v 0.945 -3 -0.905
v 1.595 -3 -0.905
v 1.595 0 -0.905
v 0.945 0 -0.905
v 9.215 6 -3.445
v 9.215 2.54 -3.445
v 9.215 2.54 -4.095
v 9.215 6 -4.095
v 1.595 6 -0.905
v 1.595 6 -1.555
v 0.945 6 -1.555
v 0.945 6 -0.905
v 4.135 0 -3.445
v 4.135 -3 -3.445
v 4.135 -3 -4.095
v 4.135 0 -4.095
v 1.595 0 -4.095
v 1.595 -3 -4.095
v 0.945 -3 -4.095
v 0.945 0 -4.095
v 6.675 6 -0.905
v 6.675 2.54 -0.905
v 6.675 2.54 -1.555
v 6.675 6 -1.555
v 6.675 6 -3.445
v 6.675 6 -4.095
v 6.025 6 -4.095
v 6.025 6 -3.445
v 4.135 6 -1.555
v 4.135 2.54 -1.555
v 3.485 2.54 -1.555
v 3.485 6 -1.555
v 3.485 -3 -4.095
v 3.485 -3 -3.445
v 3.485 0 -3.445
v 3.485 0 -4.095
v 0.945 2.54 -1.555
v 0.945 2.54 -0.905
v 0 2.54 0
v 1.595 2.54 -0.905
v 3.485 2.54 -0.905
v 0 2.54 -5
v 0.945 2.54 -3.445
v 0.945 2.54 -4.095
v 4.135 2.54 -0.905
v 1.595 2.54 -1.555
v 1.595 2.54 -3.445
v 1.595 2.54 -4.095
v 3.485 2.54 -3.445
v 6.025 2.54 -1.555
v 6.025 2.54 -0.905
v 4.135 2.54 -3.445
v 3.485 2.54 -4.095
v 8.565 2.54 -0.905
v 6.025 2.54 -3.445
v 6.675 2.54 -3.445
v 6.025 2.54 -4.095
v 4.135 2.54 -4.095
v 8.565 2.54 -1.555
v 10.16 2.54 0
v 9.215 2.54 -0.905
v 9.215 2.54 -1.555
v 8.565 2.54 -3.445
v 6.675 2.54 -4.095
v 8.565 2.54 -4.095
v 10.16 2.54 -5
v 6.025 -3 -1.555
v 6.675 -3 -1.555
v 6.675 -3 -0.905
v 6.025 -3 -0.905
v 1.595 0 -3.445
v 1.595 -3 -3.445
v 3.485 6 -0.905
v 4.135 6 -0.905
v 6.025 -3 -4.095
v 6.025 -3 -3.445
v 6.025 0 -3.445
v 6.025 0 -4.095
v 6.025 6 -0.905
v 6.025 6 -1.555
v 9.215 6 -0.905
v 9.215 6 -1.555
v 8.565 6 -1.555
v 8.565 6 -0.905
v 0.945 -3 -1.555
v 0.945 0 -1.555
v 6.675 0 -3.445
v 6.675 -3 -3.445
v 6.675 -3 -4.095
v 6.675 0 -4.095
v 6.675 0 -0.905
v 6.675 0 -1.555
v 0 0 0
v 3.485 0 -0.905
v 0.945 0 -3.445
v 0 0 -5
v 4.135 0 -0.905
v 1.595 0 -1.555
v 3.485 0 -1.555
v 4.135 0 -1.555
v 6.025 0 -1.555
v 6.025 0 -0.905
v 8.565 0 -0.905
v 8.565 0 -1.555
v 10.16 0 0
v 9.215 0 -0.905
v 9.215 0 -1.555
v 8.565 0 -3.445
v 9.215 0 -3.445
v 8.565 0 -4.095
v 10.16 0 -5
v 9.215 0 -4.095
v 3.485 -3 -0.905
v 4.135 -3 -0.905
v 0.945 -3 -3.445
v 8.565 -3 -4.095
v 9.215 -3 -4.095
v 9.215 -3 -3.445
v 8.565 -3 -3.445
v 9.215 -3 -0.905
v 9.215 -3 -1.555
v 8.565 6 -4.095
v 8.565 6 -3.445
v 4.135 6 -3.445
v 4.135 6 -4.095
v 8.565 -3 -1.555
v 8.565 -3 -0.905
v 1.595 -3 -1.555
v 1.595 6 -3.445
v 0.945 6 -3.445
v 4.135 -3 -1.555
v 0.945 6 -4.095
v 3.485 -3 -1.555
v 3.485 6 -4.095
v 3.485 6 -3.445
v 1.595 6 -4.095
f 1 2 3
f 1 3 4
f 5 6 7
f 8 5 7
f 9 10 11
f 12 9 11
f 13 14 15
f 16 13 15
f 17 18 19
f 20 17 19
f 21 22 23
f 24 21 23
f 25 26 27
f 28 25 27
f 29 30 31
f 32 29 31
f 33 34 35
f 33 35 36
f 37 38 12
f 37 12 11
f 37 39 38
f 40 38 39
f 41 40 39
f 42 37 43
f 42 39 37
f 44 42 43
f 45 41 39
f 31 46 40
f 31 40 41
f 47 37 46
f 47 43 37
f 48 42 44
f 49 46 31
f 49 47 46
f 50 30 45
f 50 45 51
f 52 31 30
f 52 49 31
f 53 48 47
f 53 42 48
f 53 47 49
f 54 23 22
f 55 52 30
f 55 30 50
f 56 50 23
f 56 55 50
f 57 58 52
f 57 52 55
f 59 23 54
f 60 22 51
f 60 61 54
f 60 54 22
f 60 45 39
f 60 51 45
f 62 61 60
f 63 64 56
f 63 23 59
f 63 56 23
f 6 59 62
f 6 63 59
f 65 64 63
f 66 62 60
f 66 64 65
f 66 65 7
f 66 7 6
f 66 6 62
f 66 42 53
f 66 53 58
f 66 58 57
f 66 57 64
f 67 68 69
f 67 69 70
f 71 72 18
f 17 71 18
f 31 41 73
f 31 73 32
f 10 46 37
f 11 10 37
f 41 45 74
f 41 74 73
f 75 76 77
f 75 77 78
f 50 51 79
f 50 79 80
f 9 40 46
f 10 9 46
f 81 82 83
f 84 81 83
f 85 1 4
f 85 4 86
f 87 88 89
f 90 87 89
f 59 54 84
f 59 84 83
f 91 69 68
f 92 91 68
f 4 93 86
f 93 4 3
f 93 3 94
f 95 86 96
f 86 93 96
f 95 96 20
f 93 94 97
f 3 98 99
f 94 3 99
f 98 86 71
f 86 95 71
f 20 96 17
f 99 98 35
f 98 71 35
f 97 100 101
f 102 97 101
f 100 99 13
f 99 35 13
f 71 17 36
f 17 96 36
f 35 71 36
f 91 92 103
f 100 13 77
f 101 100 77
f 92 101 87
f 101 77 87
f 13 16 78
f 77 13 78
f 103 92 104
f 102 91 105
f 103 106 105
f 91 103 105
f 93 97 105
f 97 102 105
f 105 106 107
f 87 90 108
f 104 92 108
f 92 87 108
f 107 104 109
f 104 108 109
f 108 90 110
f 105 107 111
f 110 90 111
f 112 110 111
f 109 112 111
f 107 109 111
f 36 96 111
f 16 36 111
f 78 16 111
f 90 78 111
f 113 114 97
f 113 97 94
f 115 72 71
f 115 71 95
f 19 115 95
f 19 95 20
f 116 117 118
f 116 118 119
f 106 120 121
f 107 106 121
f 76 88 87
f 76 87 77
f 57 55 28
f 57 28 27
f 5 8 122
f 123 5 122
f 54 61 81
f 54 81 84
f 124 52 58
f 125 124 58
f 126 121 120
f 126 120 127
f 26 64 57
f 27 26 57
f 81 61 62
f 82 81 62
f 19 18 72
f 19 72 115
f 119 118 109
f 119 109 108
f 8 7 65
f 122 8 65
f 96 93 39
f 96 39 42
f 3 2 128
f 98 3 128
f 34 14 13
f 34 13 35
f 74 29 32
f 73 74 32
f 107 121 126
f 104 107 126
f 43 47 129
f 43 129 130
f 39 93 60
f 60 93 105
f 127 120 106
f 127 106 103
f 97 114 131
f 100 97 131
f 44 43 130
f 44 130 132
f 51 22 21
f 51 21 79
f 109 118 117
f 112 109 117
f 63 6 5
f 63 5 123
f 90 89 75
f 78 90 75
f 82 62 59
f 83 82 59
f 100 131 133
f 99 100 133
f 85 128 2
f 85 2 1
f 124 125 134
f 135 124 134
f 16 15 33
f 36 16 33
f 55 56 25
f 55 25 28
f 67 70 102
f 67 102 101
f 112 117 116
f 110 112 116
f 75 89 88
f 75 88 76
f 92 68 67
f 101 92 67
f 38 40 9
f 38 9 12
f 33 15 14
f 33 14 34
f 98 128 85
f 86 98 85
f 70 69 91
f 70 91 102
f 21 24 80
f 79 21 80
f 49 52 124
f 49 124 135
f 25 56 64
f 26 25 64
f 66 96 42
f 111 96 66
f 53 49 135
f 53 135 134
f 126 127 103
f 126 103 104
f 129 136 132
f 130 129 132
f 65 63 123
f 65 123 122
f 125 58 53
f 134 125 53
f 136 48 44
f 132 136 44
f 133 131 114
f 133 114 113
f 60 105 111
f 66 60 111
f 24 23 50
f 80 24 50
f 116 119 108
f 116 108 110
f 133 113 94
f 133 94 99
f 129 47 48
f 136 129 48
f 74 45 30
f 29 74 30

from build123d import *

# Parameters (mm, degrees)
SKETCH1_W           = 10.16
SKETCH1_H           = 5
SKETCH1_W_2         = 0.65
SKETCH1_H_2         = 0.65
BOSS_EXTRUDE1_DEPTH = 2.54
SKETCH2_W           = 0.65
SKETCH2_H           = 0.65
BOSS_EXTRUDE2_DEPTH = 9


with BuildPart() as part:
    # Sketch1 → Boss-Extrude1 (new body)
    with BuildSketch(Plane(origin=(0, 0, 0), x_dir=(1, 0, 0), z_dir=(0, 1, 0))):
        with Locations((5.08, 2.5)):
            Rectangle(SKETCH1_W, SKETCH1_H)
        with Locations((1.27, 3.77)):
            Rectangle(SKETCH1_W_2, SKETCH1_H_2, mode=Mode.SUBTRACT)
        with Locations((1.27, 1.23)):
            Rectangle(SKETCH1_W_2, SKETCH1_H_2, mode=Mode.SUBTRACT)
        with Locations((3.81, 3.77)):
            Rectangle(SKETCH1_W_2, SKETCH1_H_2, mode=Mode.SUBTRACT)
        with Locations((6.35, 3.77)):
            Rectangle(SKETCH1_W_2, SKETCH1_H_2, mode=Mode.SUBTRACT)
        with Locations((8.89, 3.77)):
            Rectangle(SKETCH1_W_2, SKETCH1_H_2, mode=Mode.SUBTRACT)
        with Locations((3.81, 1.23)):
            Rectangle(SKETCH1_W_2, SKETCH1_H_2, mode=Mode.SUBTRACT)
        with Locations((6.35, 1.23)):
            Rectangle(SKETCH1_W_2, SKETCH1_H_2, mode=Mode.SUBTRACT)
        with Locations((8.89, 1.23)):
            Rectangle(SKETCH1_W_2, SKETCH1_H_2, mode=Mode.SUBTRACT)
    extrude(amount=BOSS_EXTRUDE1_DEPTH)

    # Sketch2 → Boss-Extrude2 (add)
    with BuildSketch(Plane(origin=(0, -3, 0), x_dir=(-1, 0, 0), z_dir=(0, -1, 0))):
        with Locations((-8.89, 3.77)):
            Rectangle(SKETCH2_W, SKETCH2_H)
        with Locations((-6.35, 1.23)):
            Rectangle(SKETCH2_W, SKETCH2_H)
        with Locations((-6.35, 3.77)):
            Rectangle(SKETCH2_W, SKETCH2_H)
        with Locations((-3.81, 1.23)):
            Rectangle(SKETCH2_W, SKETCH2_H)
        with Locations((-3.81, 3.77)):
            Rectangle(SKETCH2_W, SKETCH2_H)
        with Locations((-1.27, 1.23)):
            Rectangle(SKETCH2_W, SKETCH2_H)
        with Locations((-8.89, 1.23)):
            Rectangle(SKETCH2_W, SKETCH2_H)
        with Locations((-1.27, 3.77)):
            Rectangle(SKETCH2_W, SKETCH2_H)
    extrude(amount=-BOSS_EXTRUDE2_DEPTH)


solid = part.part
